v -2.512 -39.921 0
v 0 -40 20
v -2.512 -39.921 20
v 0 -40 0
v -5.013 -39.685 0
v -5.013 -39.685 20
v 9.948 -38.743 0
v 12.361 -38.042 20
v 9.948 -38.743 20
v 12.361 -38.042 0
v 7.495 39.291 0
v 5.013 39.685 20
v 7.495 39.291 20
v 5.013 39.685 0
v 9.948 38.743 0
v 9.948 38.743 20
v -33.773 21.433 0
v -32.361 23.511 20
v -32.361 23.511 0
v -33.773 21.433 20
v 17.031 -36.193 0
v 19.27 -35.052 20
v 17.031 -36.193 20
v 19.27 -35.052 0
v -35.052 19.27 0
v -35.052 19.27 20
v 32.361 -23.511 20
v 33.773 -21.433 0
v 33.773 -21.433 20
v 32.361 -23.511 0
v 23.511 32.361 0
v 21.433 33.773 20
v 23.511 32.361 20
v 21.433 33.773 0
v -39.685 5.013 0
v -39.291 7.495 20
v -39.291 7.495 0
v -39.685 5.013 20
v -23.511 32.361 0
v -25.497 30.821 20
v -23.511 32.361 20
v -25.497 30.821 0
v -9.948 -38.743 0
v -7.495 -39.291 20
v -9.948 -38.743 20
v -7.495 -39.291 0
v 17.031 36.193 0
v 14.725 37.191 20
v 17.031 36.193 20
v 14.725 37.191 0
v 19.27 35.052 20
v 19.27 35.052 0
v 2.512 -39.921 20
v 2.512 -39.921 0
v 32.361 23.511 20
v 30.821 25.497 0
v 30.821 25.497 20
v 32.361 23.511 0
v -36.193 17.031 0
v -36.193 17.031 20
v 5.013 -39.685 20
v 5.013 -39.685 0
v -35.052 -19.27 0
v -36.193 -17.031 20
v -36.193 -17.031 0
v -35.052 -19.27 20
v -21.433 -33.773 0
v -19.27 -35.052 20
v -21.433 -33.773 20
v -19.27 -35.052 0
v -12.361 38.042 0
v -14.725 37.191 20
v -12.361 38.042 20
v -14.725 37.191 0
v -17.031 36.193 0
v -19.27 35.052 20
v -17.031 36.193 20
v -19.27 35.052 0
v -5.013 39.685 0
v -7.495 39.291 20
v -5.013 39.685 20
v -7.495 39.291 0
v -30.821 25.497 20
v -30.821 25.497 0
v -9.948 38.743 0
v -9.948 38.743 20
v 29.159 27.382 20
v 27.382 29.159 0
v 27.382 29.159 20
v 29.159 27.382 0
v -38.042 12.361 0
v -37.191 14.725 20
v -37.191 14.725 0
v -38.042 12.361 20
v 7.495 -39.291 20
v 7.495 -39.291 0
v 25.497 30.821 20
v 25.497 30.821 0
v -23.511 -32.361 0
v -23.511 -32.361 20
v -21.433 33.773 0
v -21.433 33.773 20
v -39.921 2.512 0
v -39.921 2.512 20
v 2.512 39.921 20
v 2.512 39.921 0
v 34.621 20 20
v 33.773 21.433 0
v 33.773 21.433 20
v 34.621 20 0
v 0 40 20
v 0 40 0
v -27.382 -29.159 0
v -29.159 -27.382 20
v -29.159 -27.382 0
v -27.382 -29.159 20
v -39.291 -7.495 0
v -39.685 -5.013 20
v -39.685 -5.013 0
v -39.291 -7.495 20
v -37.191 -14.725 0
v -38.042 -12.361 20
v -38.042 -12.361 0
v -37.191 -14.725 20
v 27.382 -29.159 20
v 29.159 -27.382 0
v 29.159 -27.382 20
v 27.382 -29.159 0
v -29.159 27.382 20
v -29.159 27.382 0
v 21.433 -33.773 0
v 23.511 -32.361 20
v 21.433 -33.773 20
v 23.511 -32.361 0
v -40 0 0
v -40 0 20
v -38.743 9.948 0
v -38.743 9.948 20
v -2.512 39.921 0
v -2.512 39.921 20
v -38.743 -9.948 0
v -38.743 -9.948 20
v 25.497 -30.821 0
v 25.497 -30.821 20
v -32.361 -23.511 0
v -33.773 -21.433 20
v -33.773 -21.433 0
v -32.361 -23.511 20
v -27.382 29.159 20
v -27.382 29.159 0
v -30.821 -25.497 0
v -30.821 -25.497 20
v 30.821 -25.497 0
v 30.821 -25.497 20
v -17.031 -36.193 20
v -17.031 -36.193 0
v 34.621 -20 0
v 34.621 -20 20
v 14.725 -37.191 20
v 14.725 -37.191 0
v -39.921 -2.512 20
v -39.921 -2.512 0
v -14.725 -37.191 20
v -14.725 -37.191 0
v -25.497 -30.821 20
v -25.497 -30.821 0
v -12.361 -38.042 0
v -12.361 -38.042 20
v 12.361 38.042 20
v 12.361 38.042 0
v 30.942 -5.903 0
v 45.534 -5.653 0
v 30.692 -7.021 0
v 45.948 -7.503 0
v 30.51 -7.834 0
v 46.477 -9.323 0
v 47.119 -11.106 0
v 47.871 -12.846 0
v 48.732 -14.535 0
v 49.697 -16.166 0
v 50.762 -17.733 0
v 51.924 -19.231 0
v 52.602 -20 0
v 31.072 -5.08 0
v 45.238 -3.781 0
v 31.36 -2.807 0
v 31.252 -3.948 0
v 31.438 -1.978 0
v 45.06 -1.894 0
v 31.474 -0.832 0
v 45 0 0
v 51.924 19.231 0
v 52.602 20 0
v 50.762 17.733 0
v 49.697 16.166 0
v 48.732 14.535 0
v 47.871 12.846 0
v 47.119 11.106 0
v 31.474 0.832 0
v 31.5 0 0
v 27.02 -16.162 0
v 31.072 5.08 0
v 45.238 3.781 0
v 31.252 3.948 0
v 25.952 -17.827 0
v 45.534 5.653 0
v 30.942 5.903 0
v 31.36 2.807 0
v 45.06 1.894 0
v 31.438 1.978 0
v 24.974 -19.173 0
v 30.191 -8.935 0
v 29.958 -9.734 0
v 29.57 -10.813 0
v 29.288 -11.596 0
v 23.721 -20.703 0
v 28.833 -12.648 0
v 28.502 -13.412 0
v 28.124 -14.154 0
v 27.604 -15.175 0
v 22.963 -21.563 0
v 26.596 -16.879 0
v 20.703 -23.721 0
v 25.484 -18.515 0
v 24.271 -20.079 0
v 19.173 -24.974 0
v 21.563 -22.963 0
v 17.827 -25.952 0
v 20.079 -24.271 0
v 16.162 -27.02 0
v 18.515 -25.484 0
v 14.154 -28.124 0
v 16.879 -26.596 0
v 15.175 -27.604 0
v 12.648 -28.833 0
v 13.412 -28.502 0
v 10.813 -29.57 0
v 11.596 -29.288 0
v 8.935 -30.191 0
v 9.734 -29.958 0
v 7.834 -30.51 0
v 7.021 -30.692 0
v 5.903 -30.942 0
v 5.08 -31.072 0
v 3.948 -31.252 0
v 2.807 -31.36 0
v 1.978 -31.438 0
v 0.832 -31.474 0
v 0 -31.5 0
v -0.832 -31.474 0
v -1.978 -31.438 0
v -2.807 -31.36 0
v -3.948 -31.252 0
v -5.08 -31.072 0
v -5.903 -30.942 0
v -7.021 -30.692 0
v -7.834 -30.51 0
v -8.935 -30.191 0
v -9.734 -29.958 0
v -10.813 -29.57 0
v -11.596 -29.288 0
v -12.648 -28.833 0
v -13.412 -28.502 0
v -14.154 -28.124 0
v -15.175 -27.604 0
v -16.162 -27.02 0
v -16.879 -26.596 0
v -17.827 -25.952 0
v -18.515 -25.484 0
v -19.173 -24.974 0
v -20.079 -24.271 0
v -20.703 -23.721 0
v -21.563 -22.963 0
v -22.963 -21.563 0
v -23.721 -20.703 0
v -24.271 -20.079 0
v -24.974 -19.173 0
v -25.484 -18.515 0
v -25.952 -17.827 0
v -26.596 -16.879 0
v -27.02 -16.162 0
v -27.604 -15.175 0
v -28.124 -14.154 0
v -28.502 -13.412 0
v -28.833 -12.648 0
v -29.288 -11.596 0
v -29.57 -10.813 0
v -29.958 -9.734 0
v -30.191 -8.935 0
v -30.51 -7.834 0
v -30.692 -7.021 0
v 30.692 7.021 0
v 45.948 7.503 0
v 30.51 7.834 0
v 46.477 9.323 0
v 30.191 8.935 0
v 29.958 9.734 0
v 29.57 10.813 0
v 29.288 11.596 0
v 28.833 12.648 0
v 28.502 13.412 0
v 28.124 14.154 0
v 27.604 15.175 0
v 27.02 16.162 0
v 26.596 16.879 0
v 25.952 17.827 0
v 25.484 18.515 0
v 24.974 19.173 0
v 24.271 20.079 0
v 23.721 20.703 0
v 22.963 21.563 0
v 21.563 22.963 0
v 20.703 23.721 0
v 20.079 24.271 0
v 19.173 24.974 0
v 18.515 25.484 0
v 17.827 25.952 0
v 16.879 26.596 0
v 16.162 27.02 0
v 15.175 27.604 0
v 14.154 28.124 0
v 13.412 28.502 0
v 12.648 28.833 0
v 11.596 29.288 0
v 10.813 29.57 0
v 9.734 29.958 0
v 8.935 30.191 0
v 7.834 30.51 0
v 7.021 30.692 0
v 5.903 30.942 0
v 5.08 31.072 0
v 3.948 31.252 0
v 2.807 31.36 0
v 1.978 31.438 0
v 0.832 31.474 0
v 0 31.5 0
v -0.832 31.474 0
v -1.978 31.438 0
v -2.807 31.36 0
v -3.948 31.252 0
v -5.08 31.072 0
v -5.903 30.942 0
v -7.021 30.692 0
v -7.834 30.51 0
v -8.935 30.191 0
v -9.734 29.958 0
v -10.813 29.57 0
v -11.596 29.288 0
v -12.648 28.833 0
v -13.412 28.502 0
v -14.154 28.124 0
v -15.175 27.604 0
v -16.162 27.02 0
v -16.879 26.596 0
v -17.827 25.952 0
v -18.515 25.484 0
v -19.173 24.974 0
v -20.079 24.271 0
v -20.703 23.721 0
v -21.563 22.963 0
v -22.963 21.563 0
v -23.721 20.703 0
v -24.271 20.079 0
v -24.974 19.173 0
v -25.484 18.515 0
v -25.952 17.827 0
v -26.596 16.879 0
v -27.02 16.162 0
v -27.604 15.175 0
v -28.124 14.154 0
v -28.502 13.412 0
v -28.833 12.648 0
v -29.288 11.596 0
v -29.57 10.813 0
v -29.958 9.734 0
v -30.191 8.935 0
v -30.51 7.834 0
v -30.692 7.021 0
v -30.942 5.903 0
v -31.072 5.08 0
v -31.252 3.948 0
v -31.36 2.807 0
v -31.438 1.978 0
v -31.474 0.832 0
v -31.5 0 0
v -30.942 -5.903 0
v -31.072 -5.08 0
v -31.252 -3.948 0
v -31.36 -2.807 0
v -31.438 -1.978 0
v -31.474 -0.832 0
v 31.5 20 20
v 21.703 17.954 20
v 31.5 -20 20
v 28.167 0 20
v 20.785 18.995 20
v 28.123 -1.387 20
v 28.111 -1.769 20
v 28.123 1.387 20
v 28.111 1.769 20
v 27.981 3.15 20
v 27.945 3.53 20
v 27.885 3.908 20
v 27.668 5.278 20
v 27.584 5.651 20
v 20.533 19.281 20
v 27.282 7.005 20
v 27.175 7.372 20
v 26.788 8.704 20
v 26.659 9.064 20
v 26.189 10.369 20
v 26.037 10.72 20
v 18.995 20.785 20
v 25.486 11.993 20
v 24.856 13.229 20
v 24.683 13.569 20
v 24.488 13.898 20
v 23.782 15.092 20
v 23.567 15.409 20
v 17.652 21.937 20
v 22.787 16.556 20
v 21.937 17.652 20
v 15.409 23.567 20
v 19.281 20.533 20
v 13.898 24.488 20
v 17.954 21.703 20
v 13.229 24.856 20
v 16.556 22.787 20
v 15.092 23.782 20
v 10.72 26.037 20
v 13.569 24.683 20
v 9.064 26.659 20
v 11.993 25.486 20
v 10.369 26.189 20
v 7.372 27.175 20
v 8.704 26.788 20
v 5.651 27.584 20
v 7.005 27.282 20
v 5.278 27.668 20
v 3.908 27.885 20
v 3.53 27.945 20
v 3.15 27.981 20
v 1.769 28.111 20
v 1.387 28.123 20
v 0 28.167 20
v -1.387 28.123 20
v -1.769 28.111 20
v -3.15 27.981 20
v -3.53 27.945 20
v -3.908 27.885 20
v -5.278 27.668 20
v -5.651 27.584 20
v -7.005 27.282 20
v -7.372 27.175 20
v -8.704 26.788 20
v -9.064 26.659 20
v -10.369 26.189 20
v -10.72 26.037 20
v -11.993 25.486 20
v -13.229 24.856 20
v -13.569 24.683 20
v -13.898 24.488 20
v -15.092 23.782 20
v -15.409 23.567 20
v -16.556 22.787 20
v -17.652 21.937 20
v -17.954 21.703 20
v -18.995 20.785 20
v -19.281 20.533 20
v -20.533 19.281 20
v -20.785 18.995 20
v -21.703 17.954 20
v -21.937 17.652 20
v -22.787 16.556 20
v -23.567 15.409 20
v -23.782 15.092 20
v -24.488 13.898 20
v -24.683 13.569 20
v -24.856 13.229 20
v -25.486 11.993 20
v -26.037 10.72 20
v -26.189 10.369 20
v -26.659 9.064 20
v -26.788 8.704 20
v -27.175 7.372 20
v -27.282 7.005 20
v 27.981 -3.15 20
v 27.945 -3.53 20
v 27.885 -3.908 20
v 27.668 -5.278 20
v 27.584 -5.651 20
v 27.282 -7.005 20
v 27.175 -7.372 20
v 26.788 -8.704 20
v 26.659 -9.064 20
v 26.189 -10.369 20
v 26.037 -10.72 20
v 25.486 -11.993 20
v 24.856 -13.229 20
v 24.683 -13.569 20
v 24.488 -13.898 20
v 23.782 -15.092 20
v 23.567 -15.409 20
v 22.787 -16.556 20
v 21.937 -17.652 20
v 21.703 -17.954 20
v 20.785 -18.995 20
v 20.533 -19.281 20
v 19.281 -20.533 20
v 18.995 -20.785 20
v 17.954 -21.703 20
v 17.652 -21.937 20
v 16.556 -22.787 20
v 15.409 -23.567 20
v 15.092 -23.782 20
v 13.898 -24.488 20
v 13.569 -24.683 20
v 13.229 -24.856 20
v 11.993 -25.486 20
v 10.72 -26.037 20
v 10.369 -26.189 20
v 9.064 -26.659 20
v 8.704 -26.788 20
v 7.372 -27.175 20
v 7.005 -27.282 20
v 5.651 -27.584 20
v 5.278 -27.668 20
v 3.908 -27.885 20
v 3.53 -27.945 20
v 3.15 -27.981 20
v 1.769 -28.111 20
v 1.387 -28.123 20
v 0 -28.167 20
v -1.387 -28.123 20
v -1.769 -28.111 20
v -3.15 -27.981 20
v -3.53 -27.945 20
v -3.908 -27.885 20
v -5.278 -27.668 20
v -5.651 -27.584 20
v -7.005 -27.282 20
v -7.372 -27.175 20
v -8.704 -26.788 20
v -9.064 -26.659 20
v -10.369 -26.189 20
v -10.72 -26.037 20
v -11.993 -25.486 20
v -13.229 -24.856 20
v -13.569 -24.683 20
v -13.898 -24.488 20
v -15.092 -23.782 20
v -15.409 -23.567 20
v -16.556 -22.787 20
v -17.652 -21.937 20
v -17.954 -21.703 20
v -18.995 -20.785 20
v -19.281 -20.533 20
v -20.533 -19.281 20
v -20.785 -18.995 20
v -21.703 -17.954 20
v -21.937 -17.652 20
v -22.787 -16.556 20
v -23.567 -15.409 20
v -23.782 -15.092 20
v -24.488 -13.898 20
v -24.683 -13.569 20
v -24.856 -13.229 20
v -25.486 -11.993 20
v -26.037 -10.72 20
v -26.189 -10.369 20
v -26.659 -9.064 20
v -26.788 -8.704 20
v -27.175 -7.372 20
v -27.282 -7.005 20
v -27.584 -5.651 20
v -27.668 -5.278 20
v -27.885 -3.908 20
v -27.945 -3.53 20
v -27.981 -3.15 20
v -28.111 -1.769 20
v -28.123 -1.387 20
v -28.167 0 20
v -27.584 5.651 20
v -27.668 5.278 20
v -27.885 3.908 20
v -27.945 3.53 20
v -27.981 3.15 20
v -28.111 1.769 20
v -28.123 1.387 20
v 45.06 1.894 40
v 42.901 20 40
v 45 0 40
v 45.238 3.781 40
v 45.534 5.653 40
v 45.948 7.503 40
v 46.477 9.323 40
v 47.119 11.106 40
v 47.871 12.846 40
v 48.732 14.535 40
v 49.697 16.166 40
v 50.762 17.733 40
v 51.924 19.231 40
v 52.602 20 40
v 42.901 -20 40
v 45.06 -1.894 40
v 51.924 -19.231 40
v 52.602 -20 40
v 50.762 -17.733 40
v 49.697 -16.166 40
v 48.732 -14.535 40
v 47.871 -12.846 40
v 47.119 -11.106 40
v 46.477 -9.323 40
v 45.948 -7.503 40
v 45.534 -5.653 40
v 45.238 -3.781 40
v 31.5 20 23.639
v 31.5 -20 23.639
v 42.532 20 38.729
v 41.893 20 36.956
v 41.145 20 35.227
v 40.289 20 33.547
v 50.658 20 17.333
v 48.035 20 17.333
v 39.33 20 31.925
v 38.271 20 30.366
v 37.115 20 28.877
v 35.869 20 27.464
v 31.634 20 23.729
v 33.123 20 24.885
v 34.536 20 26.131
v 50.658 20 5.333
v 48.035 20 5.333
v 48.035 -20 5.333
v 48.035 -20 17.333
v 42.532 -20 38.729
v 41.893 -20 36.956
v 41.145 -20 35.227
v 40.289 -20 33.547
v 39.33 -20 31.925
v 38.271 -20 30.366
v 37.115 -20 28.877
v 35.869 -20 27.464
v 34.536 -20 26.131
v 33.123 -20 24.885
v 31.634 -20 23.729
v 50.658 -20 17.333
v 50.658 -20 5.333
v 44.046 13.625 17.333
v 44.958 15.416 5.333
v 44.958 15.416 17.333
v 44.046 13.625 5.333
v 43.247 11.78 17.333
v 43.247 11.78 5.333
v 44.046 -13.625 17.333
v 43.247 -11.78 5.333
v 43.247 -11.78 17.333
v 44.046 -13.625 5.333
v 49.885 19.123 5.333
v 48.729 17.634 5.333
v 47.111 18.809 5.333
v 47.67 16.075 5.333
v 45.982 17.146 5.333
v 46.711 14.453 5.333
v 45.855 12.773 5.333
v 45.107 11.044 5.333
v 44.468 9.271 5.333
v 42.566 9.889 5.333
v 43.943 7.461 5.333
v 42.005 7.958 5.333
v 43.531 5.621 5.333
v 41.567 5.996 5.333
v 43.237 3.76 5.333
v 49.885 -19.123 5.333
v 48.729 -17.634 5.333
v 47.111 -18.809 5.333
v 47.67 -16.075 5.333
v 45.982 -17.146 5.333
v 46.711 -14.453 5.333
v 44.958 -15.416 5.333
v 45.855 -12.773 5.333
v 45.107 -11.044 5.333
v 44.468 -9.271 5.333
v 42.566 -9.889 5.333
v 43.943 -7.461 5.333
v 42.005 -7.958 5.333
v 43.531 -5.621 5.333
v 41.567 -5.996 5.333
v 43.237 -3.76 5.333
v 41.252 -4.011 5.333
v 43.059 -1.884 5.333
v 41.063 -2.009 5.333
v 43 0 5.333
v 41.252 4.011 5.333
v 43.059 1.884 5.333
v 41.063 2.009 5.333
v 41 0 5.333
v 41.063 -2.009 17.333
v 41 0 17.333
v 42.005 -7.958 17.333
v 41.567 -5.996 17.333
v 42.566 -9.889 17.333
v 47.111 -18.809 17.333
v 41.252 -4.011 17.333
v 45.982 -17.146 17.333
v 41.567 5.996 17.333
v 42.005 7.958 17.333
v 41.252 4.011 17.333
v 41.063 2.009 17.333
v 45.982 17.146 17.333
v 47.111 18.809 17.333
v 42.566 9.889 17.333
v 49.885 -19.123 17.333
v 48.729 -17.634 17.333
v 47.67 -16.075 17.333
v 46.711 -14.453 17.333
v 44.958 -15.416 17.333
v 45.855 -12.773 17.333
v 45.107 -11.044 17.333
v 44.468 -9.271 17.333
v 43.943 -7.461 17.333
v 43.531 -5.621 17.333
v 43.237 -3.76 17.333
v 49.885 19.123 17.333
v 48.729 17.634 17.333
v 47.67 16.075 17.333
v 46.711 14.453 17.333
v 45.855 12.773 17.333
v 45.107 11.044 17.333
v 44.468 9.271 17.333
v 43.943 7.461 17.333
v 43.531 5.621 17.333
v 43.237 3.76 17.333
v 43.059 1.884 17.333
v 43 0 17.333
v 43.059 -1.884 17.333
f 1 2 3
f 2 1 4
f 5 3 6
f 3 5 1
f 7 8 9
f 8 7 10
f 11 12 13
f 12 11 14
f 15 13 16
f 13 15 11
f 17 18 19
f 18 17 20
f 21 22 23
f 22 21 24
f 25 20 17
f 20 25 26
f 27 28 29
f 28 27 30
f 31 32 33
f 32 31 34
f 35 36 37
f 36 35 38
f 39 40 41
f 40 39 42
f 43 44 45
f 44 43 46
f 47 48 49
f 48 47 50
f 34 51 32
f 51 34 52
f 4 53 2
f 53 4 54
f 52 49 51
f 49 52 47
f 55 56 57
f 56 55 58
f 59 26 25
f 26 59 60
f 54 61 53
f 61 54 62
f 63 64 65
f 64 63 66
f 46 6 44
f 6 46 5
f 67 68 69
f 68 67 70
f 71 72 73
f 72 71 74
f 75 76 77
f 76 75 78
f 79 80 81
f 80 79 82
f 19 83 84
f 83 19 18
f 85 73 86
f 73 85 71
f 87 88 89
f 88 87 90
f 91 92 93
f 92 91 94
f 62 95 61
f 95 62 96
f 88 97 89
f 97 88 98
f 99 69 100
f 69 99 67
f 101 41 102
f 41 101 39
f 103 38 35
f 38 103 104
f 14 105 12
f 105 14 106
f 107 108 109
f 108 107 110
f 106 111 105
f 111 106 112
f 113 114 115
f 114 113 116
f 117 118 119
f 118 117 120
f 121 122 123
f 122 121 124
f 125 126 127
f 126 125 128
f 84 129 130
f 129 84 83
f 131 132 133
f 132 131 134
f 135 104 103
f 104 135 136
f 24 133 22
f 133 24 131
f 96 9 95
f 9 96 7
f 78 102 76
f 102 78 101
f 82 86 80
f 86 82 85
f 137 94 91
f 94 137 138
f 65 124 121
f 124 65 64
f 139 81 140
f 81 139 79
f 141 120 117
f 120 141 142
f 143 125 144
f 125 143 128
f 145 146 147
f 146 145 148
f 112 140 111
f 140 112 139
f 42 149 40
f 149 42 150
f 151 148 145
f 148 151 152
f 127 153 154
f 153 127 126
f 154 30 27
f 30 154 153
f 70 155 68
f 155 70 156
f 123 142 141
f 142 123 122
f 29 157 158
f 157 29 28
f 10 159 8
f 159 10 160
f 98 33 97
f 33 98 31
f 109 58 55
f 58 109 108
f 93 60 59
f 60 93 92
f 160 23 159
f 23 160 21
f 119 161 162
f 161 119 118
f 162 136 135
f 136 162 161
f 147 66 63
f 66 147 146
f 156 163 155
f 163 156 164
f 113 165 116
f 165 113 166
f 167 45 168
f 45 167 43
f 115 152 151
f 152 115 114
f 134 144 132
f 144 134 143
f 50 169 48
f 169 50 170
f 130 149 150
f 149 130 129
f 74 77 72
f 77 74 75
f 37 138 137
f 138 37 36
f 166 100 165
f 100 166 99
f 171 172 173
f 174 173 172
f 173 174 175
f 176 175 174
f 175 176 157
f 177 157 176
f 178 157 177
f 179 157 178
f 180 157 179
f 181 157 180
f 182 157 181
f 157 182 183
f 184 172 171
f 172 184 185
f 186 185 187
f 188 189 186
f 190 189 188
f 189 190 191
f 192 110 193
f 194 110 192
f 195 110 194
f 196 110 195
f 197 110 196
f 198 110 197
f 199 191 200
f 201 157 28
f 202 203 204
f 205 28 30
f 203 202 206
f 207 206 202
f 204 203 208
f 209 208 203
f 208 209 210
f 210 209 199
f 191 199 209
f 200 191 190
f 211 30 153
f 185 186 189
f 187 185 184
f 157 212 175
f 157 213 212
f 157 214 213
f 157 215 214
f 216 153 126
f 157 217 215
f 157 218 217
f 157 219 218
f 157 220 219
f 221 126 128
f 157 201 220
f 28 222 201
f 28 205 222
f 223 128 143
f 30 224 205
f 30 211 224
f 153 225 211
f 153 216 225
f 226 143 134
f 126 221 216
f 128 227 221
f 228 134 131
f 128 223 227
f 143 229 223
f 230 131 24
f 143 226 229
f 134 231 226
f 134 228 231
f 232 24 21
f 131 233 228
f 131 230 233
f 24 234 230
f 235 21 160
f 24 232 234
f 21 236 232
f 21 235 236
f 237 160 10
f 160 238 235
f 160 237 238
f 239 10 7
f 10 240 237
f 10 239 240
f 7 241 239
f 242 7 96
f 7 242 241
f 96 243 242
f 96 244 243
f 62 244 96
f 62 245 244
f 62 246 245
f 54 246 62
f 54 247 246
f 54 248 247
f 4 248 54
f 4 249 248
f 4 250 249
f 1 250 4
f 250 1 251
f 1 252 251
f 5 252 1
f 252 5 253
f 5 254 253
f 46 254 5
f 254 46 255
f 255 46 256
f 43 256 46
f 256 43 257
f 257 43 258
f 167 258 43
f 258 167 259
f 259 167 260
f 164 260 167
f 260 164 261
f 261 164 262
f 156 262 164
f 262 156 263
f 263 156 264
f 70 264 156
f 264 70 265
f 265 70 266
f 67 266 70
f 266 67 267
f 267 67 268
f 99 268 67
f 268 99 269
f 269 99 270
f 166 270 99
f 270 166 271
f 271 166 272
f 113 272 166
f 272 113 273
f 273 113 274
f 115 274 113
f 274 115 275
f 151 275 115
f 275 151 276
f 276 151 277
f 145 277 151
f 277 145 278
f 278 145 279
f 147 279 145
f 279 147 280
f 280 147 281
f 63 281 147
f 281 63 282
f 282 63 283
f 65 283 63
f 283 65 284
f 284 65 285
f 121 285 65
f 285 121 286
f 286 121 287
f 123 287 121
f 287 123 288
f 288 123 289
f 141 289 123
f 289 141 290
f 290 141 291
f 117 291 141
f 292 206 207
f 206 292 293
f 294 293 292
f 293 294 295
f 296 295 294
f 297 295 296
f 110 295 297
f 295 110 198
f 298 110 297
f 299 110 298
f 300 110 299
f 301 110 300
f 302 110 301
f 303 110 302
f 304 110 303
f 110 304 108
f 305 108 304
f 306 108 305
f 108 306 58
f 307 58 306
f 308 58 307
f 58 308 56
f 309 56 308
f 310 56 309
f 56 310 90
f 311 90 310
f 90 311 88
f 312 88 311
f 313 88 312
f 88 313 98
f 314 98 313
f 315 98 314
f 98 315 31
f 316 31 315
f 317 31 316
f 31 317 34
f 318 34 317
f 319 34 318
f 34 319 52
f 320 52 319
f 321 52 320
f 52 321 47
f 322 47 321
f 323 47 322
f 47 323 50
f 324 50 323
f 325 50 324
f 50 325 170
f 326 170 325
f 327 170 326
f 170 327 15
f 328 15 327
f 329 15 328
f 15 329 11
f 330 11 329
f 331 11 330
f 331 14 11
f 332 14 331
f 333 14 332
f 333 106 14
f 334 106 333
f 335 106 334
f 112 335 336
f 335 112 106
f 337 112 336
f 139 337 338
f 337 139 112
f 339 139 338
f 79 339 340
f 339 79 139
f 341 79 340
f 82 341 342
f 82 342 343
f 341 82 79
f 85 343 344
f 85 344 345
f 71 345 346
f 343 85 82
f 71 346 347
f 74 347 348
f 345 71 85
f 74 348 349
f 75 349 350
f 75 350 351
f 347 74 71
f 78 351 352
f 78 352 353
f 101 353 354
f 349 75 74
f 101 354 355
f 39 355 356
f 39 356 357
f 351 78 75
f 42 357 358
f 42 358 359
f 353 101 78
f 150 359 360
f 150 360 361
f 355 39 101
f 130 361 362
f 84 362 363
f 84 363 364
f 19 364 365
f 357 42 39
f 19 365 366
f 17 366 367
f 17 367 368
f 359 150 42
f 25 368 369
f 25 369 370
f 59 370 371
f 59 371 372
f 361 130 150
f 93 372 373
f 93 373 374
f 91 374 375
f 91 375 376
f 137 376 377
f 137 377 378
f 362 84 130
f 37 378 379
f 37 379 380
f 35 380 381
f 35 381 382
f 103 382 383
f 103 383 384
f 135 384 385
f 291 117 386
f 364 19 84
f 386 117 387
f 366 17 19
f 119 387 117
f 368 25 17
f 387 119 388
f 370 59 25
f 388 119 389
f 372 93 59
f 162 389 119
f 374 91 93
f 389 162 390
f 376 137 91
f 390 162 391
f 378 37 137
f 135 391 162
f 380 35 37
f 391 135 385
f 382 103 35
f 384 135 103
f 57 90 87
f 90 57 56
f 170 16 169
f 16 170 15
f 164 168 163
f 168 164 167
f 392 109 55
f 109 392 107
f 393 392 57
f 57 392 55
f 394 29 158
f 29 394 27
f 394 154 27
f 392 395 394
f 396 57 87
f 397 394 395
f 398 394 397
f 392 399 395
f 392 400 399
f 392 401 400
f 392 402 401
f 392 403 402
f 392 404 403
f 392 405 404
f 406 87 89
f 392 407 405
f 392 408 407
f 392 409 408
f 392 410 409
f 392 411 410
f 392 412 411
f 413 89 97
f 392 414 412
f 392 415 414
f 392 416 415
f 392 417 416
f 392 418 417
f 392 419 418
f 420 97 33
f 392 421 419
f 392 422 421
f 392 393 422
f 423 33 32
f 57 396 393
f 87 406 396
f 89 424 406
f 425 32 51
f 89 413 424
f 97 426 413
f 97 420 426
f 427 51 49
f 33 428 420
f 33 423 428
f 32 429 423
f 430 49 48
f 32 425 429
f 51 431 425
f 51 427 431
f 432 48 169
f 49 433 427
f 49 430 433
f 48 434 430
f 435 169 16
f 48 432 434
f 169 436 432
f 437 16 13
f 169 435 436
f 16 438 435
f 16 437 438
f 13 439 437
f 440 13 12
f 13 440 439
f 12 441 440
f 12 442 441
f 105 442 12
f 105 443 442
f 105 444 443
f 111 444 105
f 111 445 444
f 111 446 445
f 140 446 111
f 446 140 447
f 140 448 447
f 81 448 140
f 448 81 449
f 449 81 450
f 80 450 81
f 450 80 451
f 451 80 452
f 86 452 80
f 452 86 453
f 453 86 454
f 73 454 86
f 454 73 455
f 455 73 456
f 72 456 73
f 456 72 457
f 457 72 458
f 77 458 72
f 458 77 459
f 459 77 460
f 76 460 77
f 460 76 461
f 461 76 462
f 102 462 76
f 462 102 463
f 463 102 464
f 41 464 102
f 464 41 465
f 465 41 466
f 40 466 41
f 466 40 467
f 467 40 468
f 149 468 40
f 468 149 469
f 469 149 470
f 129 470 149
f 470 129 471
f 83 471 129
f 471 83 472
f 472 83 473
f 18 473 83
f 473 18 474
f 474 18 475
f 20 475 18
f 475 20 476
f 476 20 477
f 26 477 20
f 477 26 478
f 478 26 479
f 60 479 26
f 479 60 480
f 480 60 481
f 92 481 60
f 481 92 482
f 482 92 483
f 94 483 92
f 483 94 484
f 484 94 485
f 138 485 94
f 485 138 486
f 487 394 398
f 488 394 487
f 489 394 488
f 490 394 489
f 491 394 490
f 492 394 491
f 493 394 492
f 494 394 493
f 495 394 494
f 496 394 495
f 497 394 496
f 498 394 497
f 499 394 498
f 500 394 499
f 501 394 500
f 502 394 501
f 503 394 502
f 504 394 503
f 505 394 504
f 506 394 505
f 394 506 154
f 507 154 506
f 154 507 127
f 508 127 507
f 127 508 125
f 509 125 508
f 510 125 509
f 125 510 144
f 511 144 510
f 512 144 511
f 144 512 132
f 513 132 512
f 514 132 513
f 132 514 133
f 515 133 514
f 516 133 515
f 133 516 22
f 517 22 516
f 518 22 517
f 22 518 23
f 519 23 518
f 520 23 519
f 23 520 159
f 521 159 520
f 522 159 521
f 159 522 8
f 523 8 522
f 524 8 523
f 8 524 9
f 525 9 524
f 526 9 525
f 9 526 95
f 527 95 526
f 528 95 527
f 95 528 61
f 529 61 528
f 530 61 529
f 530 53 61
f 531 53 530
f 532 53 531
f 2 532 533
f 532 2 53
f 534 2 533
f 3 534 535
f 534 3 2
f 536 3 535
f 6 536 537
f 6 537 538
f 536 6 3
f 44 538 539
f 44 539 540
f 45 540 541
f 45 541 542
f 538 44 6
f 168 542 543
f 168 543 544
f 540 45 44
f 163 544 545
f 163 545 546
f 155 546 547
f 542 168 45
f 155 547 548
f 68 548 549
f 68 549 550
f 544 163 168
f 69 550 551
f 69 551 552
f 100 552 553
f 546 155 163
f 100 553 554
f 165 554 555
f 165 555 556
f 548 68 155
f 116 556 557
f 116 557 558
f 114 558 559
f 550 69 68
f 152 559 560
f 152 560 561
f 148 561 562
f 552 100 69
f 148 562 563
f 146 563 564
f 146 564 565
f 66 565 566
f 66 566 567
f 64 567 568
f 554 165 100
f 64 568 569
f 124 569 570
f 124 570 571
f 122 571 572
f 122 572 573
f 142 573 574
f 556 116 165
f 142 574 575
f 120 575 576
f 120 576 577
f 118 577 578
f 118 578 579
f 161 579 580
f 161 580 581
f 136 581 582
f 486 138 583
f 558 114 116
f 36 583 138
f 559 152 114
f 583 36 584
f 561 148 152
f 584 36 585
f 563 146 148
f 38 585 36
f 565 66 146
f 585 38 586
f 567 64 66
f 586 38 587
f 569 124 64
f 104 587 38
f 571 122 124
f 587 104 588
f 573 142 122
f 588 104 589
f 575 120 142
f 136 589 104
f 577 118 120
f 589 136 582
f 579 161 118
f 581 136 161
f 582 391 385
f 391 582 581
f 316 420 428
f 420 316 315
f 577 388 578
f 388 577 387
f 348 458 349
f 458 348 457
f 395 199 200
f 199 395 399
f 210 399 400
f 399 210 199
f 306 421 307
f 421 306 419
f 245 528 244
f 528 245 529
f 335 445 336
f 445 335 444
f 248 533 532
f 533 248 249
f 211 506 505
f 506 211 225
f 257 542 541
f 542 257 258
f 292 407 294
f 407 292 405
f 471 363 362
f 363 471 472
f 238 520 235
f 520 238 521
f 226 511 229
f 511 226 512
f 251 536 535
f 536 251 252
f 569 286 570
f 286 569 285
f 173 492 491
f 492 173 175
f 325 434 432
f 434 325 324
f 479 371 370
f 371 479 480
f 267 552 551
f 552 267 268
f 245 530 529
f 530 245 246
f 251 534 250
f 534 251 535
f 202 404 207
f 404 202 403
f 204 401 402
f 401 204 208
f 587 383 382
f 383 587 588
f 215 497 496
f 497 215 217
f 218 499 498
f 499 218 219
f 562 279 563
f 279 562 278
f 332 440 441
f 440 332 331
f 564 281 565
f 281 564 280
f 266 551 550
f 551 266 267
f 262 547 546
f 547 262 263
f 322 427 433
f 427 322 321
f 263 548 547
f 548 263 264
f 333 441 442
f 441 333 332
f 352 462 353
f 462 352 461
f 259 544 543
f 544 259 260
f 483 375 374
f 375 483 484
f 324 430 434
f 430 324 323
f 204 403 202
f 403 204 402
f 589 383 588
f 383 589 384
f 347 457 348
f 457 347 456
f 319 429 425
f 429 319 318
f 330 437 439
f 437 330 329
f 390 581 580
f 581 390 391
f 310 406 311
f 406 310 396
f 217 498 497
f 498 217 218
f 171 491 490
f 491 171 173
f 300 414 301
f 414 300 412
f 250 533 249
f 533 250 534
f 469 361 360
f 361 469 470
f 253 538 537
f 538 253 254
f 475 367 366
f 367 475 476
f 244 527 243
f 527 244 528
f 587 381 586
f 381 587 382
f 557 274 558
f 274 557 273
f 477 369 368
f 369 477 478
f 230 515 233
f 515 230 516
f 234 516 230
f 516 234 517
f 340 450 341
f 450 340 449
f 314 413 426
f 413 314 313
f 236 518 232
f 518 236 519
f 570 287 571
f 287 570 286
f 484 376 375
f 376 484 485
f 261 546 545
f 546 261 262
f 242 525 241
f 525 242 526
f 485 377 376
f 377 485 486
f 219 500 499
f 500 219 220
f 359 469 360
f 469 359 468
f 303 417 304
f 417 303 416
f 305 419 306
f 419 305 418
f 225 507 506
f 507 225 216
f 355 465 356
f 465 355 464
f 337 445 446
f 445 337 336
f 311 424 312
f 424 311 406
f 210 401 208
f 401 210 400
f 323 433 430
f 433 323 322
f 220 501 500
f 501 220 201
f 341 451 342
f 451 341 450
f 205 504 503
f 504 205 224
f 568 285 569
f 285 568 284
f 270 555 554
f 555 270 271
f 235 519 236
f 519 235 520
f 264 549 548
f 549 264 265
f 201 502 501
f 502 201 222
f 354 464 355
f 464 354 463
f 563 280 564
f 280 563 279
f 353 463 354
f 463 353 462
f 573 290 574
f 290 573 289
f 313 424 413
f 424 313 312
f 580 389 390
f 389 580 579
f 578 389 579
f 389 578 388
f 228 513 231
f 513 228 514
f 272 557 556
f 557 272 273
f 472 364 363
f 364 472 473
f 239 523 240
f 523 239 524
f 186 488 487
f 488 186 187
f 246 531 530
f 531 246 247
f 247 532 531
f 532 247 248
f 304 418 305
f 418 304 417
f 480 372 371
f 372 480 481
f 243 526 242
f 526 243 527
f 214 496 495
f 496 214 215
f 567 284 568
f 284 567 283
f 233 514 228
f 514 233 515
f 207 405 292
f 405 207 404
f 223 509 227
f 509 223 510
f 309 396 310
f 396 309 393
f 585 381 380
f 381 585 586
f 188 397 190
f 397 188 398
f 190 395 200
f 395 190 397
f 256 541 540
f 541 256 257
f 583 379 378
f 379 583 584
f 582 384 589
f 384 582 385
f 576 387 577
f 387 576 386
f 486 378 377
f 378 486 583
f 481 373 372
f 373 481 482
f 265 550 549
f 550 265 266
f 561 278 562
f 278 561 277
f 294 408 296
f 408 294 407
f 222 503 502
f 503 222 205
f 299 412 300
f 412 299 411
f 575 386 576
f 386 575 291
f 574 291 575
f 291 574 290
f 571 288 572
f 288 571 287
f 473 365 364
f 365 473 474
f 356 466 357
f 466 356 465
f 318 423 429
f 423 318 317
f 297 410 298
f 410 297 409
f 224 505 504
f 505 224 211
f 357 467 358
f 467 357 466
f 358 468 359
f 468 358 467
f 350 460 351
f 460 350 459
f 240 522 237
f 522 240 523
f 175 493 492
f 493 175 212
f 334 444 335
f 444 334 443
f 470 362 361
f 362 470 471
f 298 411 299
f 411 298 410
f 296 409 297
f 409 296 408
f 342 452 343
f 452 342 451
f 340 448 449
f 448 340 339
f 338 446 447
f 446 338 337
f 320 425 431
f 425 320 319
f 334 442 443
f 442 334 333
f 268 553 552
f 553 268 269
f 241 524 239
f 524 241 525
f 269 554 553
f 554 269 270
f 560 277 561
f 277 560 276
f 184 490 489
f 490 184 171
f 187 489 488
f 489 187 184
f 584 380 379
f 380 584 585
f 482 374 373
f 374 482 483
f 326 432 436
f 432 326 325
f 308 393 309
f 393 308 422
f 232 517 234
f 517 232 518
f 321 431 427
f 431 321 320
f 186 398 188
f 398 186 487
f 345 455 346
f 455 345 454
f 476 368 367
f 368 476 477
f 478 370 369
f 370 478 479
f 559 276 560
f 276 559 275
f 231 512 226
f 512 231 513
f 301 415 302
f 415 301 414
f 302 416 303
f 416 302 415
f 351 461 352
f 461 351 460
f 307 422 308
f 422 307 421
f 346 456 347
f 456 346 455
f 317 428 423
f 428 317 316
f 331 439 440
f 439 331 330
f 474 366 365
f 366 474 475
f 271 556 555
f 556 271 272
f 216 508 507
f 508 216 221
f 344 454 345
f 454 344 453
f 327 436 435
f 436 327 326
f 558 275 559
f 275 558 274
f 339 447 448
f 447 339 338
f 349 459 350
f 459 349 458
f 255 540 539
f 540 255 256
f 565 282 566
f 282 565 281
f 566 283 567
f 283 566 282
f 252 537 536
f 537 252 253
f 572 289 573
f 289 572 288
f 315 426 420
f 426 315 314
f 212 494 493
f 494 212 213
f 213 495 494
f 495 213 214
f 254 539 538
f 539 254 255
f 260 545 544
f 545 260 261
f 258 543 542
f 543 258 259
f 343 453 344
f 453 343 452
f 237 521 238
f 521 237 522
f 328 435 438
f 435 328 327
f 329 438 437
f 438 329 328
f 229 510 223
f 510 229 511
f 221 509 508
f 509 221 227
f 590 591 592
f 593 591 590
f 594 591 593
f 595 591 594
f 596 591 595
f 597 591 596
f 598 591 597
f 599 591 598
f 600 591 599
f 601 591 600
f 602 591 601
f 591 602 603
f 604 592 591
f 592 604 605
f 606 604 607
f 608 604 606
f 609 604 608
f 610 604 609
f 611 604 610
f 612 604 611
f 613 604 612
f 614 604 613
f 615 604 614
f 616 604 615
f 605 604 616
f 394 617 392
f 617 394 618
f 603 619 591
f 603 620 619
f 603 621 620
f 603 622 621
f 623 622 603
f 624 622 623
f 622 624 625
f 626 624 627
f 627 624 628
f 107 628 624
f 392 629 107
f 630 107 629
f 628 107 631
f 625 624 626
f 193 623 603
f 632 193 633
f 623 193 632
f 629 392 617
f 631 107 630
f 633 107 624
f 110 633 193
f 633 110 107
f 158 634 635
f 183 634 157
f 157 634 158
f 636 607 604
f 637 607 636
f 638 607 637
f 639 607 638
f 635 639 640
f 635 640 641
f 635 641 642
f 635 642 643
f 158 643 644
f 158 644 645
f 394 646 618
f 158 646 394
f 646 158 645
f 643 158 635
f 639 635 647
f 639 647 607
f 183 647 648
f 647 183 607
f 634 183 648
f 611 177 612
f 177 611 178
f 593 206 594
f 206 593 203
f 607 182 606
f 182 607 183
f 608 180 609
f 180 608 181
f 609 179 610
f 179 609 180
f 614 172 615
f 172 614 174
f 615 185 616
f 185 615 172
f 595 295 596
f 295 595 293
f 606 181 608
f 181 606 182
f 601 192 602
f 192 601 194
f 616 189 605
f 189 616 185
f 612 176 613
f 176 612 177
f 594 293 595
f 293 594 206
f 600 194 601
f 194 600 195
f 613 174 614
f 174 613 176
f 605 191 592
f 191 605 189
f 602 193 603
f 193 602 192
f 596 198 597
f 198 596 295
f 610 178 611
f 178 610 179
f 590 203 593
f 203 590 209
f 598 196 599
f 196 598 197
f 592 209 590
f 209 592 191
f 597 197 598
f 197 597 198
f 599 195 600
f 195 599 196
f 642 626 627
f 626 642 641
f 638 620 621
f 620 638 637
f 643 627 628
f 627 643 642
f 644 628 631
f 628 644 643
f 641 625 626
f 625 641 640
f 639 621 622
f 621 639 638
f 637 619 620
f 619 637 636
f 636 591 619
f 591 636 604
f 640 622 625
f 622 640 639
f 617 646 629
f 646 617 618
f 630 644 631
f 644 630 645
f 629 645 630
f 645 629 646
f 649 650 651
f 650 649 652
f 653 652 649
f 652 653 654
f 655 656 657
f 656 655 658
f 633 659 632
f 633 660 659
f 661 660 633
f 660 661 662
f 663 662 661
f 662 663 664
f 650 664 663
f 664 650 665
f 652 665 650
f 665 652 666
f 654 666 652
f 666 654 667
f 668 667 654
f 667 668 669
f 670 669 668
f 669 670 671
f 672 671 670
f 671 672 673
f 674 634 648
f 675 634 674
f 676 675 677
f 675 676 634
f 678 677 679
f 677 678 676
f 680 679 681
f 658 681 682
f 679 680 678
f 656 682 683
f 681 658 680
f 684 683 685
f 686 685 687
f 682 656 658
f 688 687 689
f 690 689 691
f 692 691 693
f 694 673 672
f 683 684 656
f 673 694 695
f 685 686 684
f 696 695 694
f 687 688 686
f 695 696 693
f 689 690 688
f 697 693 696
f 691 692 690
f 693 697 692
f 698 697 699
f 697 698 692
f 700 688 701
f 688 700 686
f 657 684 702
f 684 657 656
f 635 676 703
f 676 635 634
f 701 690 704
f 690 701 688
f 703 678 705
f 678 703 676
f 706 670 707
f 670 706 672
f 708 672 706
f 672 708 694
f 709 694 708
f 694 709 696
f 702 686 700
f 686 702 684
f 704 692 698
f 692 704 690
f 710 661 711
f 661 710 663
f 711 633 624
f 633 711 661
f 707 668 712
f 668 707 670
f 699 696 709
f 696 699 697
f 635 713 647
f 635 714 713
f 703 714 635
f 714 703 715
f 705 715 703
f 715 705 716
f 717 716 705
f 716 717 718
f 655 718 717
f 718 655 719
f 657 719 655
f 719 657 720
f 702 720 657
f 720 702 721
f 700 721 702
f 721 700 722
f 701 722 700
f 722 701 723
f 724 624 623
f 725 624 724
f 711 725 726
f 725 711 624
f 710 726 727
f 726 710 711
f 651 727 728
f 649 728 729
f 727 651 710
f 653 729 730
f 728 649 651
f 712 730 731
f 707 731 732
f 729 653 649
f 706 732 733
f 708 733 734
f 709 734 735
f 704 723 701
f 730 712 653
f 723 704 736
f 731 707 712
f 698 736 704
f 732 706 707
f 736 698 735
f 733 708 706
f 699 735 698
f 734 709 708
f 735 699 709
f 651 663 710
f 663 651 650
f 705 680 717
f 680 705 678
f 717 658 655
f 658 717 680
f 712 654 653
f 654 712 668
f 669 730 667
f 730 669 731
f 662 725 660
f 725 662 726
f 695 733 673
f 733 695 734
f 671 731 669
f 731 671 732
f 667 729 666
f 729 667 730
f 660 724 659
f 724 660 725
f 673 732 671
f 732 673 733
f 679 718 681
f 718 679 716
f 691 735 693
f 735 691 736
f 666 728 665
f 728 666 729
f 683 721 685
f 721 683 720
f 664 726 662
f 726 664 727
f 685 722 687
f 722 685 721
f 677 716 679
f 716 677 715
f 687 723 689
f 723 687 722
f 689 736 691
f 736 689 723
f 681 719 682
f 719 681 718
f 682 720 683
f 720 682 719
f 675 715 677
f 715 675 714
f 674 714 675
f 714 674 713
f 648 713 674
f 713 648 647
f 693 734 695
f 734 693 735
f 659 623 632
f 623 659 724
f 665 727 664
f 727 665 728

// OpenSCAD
/* NOTES:
	writecylinder(text="text",where=[0,0,0],radius=20,height=40);
	
	Required Parameters (If supplied in this order, identifier is not required)
		text="text"	 	: Text to be written
		where=[x,y,z]	: coordinates of cylinder
		radius=mm 		: radius of cylinder
		height=mm 		: height of cylinder

	Optional Parameter:
		center=boolean :	use this to specify that cylinder is centered on coordinates
					(default is center=false)
		face="top" : Top of cylinder
		face="bottom": bottom of cylinder
		face="front" :barrel of cylinder (default if not supplied)	

	Optional Parameters: (face is not "top" or "bottom")
		east=degrees : west= degrees: (moves text east or west around z)
		up=mm or down=mm : moves text up or down along Z axis
		rotate=degrees : rotates text around Y axis (spirals around cylinder)
	
	Optional Parameters: (face="top" or face="bottom")
		east=degrees or west=degrees : rotate text east or west around top
		rotate=degrees : (similar to east west but not dependant on text orientation)
		ccw=boolean : If true, writes in a counter clockwise direction. (default=false)
		middle=mm :moves the text ?mm toward center of top or bottom surface 	

*/

use <WriteSVG.scad>


 //-- Parmetros del vaso
/* grosor = 20;
 diam_ext=80;
 diam_int = 63.3; 
 texto = "Gonzalo";
diam_tubo = 60;
*/

// Aro
module aro(grosor_aro=20,  diam_ext=80, diam_int = 63.3, texto = "Gonzalo")
{
 // Exterior Aro
 difference(){
  difference() {
     //-- Base de la rueda
    cylinder(r=diam_ext/2,h=grosor_aro,  $fn=100);
	rotate([0,180,-90])
	translate([0,0,-20])
    	writecylinder(texto,[0,0,0],diam_ext/2-0.7,grosor_aro);
   } 

    //-- Taladro aro
   cylinder(r1=diam_int/2+5, r2=diam_int/2-5,h=grosor_aro*3,$fn=100,center=true);
 }
}

//Base asa
module base_asa(altura=40, diam_int = 63.3, diam_ext=80, diam_tubo = 60)
{
difference(){
difference(){
 translate([diam_int/2,-20,0])
 cube([30,40,altura]);

translate([(diam_ext+diam_tubo)/2+5,0,altura/2])
  cylinder(r=diam_tubo/2, h=altura*2,$fn=100,center=true);
}

translate([14,21,48])
rotate([90,0,0])
cylinder(r=60/2,h=42,  $fn=100);
}
}

//Cuerpdel soporte del vaso
module cuerpo_sv(grosor_aro=20,  diam_ext=80, diam_int = 63, texto = "Gonzalo",altura=40, diam_tubo = 60.34){
 aro(grosor_aro,  diam_ext, diam_int, texto);
 base_asa(altura, diam_int, diam_ext, diam_tubo);
}

module agarradera( diam_ext=80, diam_int = 63.3, altura_ag=12, ancho_ag=2, diam_tubo = 60){
difference(){
  	translate([(diam_ext+diam_tubo)/2+3,0,0])
	cylinder(r=diam_tubo/2+ancho_ag, h=altura_ag,$fn=100);

  	translate([(diam_ext+diam_tubo)/2+3,0,-altura_ag*2])
	cylinder(r=diam_tubo/2, h=altura_ag*4,$fn=100);
}
}

module agarraderas( altura_asa=40, diam_ext=80, diam_int = 63.3, altura_ag=12, ancho_ag=2, diam_tubo = 60){
separacion=(altura_asa-altura_ag*2)/3;
translate([0,0,separacion])
agarradera(diam_ext, diam_int , altura_ag, ancho_ag, diam_tubo );

/*translate([0,0,separacion*2+altura_ag])
agarradera(diam_ext, diam_int , altura_ag, ancho_ag, diam_tubo );
*/
}

module soporte_vaso(){
	difference(){	
		cuerpo_sv();
		agarraderas();
	}
}
/*difference(){	
soporte_vaso();
color("Red")
translate([14,21,48])
rotate([90,0,0])
cylinder(r=60/2,h=42,  $fn=100);
}*/

soporte_vaso();
